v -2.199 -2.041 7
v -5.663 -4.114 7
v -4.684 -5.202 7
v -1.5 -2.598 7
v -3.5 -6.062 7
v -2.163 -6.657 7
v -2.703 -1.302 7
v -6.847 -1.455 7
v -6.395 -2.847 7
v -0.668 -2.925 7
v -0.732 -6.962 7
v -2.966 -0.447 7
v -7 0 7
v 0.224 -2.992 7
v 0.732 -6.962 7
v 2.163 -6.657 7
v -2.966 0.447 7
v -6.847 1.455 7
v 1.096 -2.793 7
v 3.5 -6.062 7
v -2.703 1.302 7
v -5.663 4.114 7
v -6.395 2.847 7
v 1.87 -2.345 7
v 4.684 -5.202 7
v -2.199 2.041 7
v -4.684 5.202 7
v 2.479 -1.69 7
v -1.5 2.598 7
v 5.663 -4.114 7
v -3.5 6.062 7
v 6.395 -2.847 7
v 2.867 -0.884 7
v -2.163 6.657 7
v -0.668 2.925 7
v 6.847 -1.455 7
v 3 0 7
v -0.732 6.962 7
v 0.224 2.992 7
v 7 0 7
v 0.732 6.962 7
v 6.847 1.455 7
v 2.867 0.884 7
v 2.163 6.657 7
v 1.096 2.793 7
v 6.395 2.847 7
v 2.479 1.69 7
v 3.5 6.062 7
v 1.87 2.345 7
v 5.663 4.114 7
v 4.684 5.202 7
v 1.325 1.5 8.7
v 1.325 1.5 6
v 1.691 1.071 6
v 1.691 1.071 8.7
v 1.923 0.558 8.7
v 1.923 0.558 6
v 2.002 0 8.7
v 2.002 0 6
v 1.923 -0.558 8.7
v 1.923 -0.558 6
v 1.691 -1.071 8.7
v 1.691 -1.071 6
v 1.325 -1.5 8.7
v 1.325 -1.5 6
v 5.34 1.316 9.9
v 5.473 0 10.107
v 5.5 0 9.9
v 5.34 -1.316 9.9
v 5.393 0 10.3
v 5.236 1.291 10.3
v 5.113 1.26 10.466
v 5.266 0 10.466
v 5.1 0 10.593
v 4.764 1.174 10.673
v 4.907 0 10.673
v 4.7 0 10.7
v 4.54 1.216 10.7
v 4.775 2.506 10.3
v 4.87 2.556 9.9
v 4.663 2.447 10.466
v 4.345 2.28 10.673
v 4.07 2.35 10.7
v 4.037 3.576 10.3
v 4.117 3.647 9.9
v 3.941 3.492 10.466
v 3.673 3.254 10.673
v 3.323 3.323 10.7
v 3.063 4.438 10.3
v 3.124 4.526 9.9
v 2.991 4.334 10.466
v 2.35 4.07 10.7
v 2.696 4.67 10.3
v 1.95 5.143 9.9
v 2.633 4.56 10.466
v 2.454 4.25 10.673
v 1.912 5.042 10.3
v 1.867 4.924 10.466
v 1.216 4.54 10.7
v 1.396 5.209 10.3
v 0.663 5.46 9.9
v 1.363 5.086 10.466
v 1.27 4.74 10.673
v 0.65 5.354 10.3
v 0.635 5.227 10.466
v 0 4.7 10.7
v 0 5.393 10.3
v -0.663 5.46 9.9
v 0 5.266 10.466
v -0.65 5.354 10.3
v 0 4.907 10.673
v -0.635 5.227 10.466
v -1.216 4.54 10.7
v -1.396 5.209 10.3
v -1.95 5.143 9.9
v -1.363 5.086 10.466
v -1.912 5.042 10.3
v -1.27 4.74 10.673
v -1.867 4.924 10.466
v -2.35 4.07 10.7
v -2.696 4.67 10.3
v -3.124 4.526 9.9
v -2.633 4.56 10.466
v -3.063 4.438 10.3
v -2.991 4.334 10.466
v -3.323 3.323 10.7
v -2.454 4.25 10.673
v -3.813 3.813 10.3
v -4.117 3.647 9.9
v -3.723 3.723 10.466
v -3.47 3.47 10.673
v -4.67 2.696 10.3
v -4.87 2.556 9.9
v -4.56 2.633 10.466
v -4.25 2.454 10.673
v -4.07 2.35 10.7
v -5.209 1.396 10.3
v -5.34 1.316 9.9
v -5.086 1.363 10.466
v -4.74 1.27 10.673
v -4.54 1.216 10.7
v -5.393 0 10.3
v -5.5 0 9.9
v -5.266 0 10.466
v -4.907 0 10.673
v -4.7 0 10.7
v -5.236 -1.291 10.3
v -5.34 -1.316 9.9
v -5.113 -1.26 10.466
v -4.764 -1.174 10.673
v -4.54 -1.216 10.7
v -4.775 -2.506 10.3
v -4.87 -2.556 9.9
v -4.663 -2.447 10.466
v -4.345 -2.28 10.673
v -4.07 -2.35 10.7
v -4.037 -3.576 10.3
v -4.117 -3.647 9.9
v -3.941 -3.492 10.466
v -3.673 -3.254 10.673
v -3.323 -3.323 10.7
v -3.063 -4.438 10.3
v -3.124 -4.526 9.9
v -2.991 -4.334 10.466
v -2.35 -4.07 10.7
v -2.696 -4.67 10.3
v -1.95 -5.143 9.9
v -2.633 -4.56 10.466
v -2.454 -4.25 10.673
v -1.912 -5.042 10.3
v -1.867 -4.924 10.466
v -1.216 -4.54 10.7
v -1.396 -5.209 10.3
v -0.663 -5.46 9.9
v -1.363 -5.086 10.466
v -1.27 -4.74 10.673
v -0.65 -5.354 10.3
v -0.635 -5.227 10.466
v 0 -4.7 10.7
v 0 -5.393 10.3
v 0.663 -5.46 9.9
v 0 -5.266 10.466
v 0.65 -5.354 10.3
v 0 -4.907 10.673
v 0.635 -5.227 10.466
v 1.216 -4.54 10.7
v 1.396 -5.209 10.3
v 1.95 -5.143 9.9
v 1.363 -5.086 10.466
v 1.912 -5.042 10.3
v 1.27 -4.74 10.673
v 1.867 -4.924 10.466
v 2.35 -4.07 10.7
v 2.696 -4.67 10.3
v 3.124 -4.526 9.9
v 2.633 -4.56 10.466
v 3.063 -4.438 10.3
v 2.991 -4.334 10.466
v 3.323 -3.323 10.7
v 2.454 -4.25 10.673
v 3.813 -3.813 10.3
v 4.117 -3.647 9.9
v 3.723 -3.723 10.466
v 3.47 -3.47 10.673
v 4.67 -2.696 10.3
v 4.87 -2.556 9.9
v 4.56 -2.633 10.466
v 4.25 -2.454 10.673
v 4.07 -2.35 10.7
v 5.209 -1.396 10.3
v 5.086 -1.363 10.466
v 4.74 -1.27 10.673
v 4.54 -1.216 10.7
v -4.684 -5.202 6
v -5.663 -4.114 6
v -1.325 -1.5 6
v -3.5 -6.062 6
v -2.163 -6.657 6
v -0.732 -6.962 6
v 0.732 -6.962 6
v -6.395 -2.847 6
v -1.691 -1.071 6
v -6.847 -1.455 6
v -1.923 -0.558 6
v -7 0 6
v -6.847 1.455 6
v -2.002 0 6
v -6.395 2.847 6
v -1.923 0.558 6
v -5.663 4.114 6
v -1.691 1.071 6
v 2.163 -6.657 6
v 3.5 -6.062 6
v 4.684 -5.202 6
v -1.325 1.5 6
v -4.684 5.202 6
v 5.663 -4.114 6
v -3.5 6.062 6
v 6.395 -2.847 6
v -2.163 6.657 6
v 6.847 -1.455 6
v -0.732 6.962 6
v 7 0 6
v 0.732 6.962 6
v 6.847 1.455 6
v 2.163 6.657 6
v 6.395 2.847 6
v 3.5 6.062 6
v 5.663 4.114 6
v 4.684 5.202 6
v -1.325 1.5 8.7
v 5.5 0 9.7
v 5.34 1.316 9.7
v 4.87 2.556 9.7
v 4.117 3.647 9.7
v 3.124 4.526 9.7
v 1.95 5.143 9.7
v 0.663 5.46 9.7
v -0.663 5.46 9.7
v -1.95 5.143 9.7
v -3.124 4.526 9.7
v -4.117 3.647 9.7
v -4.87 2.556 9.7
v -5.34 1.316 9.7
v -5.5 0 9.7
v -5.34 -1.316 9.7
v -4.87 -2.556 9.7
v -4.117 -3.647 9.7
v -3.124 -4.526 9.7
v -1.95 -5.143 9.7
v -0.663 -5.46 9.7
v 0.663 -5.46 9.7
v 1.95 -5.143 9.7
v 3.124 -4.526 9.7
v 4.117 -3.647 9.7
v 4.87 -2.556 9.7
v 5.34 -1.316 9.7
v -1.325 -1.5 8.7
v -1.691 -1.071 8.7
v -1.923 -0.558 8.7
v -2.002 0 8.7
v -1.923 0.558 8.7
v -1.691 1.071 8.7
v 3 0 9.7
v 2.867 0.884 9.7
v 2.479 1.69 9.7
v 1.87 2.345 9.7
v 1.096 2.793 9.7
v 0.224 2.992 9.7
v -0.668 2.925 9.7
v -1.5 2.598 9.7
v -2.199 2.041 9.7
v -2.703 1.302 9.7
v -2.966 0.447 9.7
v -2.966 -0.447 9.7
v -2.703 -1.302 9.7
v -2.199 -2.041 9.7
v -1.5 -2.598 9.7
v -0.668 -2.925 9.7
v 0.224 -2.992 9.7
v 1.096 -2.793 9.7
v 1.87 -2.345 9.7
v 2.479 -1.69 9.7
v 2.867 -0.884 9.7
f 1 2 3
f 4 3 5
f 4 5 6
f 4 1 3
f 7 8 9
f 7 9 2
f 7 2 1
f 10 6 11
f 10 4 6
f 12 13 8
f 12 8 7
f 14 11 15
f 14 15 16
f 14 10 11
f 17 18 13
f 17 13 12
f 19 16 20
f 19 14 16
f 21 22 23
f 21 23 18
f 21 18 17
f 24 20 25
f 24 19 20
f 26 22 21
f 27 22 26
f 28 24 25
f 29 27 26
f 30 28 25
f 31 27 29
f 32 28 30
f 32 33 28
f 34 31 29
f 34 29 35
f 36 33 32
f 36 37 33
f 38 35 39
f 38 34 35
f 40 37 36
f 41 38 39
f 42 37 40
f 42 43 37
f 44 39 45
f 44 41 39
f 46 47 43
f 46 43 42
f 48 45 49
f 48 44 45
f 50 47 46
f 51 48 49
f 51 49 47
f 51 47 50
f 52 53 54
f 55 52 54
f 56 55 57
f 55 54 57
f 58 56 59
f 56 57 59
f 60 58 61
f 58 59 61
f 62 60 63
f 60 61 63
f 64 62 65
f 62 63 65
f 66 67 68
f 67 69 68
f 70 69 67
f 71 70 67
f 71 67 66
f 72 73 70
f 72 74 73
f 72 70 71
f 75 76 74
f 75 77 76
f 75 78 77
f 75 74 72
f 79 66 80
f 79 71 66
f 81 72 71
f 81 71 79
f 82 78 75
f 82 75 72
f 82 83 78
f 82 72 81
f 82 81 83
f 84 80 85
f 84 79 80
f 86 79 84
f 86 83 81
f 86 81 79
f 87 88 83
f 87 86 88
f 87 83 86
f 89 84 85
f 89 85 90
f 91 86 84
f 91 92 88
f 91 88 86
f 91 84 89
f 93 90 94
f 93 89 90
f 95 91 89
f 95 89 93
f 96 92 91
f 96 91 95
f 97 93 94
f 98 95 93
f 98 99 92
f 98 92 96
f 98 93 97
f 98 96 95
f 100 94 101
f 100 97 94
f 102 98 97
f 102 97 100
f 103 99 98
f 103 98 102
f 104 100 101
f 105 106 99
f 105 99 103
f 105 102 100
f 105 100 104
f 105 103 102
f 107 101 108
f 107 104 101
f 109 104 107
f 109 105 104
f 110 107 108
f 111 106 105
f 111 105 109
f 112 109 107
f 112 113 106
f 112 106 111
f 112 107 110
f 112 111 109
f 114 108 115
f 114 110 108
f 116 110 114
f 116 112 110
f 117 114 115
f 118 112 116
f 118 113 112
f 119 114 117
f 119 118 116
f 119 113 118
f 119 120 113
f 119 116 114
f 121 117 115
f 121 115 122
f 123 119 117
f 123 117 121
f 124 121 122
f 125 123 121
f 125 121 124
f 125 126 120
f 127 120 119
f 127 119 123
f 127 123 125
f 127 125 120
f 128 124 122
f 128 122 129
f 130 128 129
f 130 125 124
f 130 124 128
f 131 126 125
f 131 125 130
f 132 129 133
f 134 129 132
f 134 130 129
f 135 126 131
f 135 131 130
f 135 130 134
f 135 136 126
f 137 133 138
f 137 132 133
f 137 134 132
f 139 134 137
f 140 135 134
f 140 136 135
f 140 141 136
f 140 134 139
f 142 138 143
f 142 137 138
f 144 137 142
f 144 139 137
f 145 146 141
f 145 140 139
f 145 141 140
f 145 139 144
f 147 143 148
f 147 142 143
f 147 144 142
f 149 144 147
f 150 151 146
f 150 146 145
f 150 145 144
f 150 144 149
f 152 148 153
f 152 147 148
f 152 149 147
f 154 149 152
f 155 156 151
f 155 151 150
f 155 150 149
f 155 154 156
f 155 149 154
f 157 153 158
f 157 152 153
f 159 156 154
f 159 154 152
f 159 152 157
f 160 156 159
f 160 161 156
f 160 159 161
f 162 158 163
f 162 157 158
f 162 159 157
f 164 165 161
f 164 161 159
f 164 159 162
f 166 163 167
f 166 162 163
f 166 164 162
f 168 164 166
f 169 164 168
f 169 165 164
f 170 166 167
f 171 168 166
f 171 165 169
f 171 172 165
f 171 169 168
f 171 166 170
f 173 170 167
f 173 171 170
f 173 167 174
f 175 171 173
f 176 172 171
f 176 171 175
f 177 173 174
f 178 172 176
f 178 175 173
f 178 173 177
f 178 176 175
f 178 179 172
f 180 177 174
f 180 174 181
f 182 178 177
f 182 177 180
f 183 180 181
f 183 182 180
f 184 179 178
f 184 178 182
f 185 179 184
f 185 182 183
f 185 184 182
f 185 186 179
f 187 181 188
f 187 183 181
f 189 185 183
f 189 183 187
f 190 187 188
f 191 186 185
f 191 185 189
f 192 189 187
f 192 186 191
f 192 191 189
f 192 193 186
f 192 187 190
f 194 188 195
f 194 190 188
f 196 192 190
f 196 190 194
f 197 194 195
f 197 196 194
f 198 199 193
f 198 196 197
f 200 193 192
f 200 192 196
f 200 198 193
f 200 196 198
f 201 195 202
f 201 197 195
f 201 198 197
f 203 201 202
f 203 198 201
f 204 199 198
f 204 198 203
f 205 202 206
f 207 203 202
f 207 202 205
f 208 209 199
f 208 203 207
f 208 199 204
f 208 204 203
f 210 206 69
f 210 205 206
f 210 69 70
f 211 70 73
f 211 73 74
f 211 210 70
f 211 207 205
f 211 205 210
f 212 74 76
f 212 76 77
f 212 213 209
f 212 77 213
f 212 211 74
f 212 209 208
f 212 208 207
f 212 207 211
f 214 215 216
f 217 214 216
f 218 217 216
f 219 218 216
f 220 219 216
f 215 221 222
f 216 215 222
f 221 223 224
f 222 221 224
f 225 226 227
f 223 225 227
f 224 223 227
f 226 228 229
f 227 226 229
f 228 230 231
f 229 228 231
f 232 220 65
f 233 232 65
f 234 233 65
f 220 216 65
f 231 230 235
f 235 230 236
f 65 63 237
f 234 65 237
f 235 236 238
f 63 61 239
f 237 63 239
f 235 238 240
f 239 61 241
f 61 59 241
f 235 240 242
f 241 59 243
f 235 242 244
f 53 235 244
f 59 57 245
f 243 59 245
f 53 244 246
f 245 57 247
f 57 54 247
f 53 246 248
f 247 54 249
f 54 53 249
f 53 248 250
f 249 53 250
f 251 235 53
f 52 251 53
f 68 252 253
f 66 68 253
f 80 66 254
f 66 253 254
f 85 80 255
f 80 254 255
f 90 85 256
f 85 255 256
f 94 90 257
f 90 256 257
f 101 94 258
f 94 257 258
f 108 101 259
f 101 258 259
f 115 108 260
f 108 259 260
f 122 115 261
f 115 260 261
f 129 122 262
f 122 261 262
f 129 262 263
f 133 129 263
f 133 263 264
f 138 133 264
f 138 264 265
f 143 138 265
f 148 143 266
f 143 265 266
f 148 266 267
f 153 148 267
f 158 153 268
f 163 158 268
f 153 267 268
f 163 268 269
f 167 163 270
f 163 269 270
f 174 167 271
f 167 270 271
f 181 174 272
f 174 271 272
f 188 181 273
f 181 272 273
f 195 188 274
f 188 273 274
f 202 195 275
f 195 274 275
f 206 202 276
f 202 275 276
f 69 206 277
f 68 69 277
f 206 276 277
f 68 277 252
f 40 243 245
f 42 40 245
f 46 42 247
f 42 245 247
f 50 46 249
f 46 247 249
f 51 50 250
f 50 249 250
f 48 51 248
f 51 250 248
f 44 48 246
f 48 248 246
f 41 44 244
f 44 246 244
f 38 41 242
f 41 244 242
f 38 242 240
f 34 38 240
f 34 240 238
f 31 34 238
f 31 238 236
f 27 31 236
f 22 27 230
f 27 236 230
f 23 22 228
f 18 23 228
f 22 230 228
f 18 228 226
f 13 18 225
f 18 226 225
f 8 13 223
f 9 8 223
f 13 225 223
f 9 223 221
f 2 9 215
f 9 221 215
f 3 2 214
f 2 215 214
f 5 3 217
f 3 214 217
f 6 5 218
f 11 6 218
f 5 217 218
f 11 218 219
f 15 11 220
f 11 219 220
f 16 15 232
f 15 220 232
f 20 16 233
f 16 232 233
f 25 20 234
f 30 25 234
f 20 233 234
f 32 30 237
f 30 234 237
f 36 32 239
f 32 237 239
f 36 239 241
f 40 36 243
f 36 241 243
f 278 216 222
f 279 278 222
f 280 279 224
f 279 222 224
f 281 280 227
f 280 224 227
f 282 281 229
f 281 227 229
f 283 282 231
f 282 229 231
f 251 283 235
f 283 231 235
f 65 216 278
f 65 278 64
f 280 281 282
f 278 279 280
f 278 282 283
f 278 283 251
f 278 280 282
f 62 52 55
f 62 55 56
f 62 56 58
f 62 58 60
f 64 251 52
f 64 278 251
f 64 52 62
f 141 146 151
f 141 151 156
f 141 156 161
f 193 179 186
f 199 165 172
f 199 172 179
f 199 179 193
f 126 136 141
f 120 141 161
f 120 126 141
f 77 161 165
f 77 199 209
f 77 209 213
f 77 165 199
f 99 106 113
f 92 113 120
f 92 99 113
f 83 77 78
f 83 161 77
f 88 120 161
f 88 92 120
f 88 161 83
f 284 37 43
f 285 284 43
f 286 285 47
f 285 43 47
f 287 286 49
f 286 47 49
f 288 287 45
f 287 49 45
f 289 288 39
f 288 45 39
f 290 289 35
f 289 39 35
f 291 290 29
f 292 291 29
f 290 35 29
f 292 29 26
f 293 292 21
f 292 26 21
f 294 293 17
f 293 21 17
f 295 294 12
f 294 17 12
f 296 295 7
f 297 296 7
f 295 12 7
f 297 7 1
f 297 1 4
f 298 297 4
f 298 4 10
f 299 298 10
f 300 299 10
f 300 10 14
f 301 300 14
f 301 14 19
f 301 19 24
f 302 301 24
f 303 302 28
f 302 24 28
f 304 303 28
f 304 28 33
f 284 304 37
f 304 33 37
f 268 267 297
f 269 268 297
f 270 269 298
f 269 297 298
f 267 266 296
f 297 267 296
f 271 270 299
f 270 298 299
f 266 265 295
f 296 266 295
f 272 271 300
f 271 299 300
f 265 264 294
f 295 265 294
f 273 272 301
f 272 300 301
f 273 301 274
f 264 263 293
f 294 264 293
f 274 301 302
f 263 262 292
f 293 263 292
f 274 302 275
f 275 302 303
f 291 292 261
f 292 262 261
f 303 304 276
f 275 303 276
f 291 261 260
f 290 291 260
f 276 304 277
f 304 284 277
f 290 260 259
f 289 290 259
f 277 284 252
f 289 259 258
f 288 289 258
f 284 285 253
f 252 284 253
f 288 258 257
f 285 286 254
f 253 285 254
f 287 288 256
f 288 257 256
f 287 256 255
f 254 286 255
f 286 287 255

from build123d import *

# Parameters (mm, degrees)
SKETCH006_R     = 7
PAD005_DEPTH    = 1
SKETCH007_R     = 3
PAD006_DEPTH    = 2.7
SKETCH008_R     = 5.5
PAD007_DEPTH    = 1
FILLET_R        = 0.8
POCKET001_DEPTH = 2.7


with BuildPart() as part:
    # Sketch006 → Pad005 (new body)
    with BuildSketch(Plane.XY):
        Circle(SKETCH006_R)
    extrude(amount=PAD005_DEPTH)

    # Sketch007 (on Face3 of Pad005) → Pad006 (join)
    with BuildSketch(Plane.XY.offset(1)):
        Circle(SKETCH007_R)
    extrude(amount=PAD006_DEPTH)

    # Sketch008 (on Face5 of Pad006) → Pad007 (join)
    with BuildSketch(Plane.XY.offset(3.7)):
        Circle(SKETCH008_R)
    extrude(amount=PAD007_DEPTH)

    # Fillet
    fillet_edges = [part.edges().sort_by_distance(p)[0] for p in [
        (-5.5, 0, 4.7),
    ]]
    fillet(fillet_edges, radius=FILLET_R)

    # Sketch009 (on Face8 of Fillet) → Pocket001 (cut)
    with BuildSketch(Plane(origin=(0, 0, 0), x_dir=(1, 0, 0), z_dir=(0, 0, -1))):
        with BuildLine():
            ThreePointArc((-1.325, 1.5), (-2.002124, 0), (-1.325, -1.5))
            Line((-1.325, -1.5), (1.325, -1.5))
            ThreePointArc((1.325, -1.5), (2.002124, 0), (1.325, 1.5))
            Line((-1.325, 1.5), (1.325, 1.5))
        make_face()
    extrude(amount=-POCKET001_DEPTH, mode=Mode.SUBTRACT)


with BuildPart() as part_1:
    # Body003 placement: moved
    add(part.part.moved(Location((0, 0, 6))))


solid = part_1.part
